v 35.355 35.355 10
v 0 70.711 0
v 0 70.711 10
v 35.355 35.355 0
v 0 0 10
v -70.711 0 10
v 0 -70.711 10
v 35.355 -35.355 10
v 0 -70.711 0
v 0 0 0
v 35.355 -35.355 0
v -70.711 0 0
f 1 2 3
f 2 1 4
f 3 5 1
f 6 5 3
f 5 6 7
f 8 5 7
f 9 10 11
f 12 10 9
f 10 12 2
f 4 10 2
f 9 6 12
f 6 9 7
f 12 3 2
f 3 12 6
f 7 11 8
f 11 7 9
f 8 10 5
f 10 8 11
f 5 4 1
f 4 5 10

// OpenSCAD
module corner(size, depth) {
    rotate([0, 0, 45]) {
        translate([-size / 2, -size / 2, 0]) {
            difference() {
                cube([size, size, depth]);
                translate([size / 2, 0, 0]) {
                    cube([size / 2, size / 2, depth]);
                }
            }
        }
    }
}

corner(100, 10);
